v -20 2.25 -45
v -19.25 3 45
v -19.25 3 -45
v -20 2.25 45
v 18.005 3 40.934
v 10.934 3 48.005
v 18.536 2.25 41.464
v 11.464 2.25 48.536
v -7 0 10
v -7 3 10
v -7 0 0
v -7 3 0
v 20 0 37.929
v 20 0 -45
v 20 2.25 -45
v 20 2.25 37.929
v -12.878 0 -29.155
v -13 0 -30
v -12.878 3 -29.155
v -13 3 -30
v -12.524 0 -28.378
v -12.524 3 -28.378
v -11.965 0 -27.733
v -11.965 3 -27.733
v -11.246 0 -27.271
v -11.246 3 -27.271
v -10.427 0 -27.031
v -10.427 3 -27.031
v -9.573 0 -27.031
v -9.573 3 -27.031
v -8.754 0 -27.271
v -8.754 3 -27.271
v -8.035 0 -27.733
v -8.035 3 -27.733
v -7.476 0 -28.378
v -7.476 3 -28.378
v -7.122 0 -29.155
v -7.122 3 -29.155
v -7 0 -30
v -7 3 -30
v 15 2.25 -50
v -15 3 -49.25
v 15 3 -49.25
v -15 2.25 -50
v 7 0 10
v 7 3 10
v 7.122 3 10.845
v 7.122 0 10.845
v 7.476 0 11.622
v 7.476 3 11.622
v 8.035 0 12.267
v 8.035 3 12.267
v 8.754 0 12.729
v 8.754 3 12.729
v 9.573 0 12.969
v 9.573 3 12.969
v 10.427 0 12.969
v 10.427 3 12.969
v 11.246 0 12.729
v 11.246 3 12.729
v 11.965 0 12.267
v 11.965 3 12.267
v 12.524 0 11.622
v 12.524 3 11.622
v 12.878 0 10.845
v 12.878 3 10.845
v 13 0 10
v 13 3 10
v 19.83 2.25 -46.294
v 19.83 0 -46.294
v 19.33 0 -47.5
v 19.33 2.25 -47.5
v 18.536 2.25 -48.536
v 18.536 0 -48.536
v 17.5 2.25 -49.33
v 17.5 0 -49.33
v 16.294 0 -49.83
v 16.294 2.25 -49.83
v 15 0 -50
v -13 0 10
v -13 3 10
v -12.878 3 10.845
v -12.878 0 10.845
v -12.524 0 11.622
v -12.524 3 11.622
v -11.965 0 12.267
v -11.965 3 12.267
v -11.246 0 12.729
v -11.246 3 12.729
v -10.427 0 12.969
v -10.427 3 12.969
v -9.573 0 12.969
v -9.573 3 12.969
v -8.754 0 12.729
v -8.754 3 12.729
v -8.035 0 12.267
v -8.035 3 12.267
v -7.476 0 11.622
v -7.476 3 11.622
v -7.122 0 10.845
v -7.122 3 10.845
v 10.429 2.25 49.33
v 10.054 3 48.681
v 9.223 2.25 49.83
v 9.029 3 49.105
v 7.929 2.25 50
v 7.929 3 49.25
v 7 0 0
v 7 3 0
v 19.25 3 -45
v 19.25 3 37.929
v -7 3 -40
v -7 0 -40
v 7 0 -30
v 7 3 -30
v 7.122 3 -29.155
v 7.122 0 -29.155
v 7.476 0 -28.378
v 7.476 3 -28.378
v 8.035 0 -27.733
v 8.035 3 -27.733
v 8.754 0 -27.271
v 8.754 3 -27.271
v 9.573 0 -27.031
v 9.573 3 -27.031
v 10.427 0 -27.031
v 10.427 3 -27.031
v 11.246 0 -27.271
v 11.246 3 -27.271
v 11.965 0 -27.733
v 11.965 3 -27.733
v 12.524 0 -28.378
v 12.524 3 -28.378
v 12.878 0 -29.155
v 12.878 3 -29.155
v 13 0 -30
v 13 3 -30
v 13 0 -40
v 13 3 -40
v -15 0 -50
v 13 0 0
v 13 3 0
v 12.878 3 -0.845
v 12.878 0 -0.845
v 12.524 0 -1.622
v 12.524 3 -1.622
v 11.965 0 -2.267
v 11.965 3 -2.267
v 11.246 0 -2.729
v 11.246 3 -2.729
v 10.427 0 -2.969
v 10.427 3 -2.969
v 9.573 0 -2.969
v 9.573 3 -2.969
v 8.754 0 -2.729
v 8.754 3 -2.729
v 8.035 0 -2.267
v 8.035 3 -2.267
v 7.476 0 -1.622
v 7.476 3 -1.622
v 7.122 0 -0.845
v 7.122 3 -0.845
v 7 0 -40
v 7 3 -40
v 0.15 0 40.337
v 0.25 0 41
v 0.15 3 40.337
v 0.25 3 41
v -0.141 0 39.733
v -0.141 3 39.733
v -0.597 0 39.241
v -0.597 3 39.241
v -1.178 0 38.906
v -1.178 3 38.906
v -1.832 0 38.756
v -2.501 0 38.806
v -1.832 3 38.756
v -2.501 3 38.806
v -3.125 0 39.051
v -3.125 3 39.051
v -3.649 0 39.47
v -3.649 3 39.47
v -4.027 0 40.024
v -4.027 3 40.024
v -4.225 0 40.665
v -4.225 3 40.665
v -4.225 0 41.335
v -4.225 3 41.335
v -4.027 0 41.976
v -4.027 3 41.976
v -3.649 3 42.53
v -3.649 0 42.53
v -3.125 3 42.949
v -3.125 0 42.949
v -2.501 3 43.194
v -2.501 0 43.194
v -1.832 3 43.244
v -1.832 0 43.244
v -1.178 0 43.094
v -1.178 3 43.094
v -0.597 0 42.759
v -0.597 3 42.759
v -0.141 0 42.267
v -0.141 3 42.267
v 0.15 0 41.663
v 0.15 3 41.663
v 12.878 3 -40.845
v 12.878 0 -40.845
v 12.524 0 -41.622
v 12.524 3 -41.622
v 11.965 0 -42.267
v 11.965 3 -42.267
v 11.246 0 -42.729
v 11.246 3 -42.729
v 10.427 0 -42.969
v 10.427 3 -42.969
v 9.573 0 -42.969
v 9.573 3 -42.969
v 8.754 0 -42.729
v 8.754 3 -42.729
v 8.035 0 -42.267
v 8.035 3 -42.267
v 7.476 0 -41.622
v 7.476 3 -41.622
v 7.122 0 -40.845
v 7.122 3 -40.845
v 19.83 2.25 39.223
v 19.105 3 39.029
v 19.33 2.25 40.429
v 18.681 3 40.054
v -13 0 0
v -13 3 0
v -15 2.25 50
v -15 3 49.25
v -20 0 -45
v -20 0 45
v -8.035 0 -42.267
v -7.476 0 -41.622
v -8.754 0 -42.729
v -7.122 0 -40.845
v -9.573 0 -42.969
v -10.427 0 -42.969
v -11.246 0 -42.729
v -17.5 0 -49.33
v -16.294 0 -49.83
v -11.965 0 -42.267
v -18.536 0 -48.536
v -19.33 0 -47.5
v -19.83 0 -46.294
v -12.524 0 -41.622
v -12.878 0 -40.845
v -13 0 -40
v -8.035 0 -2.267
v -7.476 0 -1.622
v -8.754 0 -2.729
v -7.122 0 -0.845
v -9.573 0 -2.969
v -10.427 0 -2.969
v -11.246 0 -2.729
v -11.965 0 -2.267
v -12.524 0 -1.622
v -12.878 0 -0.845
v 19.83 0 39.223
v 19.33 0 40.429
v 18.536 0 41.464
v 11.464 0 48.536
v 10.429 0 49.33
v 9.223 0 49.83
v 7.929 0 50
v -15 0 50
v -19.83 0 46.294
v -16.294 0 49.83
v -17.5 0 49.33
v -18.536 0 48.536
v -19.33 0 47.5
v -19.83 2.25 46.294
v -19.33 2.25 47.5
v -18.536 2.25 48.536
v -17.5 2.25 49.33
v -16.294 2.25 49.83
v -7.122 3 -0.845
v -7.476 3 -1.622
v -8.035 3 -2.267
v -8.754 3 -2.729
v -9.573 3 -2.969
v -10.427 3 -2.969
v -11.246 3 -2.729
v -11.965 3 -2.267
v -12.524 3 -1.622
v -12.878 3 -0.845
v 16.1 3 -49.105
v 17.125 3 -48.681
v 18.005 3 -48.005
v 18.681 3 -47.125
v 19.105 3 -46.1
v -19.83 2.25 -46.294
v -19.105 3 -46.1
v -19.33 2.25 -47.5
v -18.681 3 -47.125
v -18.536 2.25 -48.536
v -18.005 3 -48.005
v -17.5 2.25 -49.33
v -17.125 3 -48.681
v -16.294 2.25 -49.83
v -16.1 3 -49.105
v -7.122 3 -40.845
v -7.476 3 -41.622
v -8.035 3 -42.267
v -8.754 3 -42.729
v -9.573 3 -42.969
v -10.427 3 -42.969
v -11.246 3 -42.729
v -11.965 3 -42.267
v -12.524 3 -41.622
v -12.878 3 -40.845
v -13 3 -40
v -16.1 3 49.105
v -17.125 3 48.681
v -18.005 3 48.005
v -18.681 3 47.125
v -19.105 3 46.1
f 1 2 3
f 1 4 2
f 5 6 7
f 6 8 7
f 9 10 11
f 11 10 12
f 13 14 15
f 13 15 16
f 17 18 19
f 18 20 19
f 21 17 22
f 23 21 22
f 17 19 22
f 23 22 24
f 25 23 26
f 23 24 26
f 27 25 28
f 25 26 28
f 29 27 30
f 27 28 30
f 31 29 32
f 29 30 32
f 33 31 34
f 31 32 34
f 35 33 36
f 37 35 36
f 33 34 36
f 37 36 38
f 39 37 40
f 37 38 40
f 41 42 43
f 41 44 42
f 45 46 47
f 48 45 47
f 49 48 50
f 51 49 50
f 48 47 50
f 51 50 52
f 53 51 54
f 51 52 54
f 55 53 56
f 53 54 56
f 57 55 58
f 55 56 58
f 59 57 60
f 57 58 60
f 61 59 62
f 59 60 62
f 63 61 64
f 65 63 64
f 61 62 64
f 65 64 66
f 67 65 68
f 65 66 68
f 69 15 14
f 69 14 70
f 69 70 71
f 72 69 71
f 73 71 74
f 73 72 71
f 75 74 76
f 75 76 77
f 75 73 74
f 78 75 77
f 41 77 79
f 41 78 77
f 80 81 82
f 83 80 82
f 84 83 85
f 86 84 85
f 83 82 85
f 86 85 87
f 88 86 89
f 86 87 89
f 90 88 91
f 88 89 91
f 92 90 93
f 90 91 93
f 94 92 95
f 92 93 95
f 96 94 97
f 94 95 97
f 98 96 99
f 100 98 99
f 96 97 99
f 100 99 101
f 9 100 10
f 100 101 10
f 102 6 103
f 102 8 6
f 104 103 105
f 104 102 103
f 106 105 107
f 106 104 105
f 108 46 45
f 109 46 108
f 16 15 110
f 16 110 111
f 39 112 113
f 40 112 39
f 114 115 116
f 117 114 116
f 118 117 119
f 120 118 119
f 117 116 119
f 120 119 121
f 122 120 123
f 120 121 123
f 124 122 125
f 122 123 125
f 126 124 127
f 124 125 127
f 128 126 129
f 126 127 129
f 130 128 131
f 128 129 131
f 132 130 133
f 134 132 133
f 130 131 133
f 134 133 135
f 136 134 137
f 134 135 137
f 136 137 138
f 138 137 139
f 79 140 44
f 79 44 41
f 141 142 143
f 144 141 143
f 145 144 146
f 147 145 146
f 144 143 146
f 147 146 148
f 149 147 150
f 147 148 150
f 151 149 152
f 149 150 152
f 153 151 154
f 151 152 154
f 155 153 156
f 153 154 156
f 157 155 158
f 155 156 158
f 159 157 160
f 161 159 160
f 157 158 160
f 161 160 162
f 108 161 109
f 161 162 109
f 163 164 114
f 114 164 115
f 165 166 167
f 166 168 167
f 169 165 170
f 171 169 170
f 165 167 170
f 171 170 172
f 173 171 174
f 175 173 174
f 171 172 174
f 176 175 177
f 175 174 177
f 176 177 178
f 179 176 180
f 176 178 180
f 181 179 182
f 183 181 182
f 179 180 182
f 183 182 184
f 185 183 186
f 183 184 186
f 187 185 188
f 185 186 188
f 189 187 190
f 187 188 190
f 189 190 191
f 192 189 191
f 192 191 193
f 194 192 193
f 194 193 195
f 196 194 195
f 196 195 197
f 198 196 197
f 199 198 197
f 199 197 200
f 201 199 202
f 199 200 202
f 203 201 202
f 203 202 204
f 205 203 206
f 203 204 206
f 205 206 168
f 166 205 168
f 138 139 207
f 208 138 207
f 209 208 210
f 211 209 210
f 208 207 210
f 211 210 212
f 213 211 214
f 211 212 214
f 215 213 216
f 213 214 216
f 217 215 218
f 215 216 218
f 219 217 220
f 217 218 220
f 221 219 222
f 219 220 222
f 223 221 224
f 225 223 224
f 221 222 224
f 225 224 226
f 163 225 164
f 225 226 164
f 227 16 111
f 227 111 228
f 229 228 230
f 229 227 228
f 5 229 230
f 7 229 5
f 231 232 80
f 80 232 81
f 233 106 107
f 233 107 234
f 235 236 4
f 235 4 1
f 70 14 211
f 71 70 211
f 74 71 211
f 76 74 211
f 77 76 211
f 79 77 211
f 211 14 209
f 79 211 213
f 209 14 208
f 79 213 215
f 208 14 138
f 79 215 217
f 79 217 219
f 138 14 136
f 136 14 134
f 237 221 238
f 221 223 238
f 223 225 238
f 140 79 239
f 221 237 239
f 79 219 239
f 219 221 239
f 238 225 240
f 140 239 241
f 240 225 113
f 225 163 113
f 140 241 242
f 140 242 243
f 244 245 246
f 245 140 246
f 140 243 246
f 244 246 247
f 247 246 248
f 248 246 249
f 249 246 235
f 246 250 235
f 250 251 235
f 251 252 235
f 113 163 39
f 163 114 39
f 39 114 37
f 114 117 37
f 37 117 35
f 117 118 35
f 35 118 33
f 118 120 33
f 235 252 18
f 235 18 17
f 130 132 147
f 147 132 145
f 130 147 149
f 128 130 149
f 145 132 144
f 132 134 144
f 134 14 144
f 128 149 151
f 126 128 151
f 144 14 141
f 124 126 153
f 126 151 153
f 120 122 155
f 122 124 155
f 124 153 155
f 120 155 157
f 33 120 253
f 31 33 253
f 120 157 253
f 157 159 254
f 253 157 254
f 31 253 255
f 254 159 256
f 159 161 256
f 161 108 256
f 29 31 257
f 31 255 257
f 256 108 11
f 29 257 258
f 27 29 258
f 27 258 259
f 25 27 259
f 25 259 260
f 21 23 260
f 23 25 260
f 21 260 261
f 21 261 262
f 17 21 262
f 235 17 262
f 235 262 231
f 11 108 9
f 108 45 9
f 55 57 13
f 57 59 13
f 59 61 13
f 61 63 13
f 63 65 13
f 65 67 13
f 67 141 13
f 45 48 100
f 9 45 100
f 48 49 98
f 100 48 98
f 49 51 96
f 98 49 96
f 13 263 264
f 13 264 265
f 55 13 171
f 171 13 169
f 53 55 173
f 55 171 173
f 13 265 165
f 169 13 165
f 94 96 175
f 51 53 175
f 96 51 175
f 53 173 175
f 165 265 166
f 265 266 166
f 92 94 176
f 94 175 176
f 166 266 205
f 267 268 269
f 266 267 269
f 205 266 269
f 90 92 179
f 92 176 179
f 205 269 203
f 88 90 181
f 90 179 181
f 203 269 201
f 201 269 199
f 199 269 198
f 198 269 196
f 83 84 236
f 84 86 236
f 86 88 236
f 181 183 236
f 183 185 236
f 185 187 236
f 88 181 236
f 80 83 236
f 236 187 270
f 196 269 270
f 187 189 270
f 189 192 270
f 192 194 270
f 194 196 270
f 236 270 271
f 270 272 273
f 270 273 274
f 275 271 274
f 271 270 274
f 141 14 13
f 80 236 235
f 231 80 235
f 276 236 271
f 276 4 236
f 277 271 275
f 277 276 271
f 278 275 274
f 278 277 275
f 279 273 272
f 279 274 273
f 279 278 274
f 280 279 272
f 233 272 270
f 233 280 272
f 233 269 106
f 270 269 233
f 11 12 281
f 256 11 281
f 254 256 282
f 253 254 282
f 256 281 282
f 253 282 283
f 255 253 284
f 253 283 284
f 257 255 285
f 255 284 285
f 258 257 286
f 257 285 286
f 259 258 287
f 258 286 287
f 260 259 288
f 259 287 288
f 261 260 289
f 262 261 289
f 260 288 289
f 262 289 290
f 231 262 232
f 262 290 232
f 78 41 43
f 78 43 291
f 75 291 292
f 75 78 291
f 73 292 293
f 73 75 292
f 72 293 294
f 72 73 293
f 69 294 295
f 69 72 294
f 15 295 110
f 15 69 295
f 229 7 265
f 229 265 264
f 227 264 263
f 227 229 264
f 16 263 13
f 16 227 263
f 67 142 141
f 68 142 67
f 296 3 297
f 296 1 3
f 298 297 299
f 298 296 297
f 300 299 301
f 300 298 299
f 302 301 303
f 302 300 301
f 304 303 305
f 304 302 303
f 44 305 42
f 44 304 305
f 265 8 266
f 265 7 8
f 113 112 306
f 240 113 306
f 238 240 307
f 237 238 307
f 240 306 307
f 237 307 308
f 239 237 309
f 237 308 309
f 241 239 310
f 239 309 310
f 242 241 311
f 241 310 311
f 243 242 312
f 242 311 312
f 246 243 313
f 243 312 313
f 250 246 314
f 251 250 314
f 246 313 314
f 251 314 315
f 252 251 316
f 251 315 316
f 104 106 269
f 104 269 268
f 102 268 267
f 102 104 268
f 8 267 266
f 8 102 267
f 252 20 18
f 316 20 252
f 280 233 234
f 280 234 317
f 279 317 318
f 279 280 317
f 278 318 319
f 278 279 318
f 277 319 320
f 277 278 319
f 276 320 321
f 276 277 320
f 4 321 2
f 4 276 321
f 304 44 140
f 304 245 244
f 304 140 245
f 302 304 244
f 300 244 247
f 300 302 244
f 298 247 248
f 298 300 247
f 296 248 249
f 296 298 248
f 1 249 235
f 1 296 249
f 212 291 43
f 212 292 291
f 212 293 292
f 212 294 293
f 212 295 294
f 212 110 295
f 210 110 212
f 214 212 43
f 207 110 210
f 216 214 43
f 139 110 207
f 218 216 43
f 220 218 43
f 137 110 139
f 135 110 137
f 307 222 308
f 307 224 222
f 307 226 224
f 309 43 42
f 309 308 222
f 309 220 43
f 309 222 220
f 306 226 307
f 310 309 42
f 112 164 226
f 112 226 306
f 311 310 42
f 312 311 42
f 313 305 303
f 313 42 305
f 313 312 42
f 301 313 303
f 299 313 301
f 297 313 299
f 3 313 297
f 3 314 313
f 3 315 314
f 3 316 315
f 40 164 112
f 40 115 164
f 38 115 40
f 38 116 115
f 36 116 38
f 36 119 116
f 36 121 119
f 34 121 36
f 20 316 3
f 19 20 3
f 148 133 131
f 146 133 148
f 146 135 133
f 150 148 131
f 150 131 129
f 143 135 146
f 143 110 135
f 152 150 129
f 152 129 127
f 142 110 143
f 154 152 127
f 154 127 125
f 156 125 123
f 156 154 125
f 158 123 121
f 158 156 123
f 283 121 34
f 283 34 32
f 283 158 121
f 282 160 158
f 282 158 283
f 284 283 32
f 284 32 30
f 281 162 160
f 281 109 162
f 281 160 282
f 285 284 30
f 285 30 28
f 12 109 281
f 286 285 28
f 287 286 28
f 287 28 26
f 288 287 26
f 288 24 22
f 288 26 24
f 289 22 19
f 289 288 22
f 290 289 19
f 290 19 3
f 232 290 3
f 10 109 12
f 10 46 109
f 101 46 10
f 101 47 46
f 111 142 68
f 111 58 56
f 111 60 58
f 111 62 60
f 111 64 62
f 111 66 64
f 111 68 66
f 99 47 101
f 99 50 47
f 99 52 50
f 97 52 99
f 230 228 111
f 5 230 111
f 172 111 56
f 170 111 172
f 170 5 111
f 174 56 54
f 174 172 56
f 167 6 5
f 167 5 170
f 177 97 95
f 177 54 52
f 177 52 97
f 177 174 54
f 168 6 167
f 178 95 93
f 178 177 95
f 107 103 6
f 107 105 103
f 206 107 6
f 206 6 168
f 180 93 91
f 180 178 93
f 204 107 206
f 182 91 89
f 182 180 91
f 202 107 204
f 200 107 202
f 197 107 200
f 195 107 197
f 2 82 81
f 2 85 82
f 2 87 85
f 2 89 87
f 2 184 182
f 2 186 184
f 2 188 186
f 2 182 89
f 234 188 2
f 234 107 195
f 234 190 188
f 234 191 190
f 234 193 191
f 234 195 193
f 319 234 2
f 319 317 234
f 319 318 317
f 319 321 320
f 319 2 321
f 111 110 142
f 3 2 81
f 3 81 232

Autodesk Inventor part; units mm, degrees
ref_plane "YZ Plane" through (0, 0, 0) normal (1, 0, 0) x (0, 1, 0)
ref_plane "XZ Plane" through (0, 0, 0) normal (0, 1, 0) x (-1, 0, 0)
ref_plane "XY Plane" through (0, 0, 0) normal (0, 0, 1) x (1, 0, 0)
sketch "Sketch1" plane through (0, 0, 0) normal (0, 1, 0) x (-1, 0, 0)
  line L0 (-20, 50) -> (20, 50)
  line L1 (20, 50) -> (20, -50)
  line L2 (20, -50) -> (-20, -50)
  line L3 (-20, -50) -> (-20, 50)
  line L4 (-20, 50) -> (20, -50) construction
  line L5 (20, 50) -> (-20, -50) construction
  point P0 (0, 0)
  dimension "d0" = 100
  dimension "d1" = 40
extrude "Extrusion1" add sketch "Sketch1" along normal blind 3
sketch "Sketch2" plane through (0, 3, 0) normal (0, 1, 0) x (1, 0, 0)
  line L0 (-10, -10) -> (-10, 0) construction
  line L1 (-7, -10) -> (-7, 0)
  line L2 (-13, 0) -> (-13, -10)
  arc A0 (-13, -10) -> (-7, -10) centre (-10, -10) ccw
  arc A1 (-7, 0) -> (-13, 0) centre (-10, 0) ccw
  line L3 (-32, 15) -> (32, 15) construction
  line L4 (20, 50) -> (-20, 50) projected
  line L5 (0, 82) -> (0, -72) projected
  line L6 (-10, 40) -> (-10, 30) construction
  line L7 (-7, 40) -> (-7, 30)
  line L8 (-13, 30) -> (-13, 40)
  arc A2 (-7, 40) -> (-13, 40) centre (-10, 40) ccw
  arc A3 (-13, 30) -> (-7, 30) centre (-10, 30) ccw
  line L9 (10, -10) -> (10, 0) construction
  line L10 (7, -10) -> (7, 0)
  line L11 (13, 0) -> (13, -10)
  arc A4 (7, -10) -> (13, -10) centre (10, -10) ccw
  arc A5 (13, 0) -> (7, 0) centre (10, 0) ccw
  line L12 (10, 40) -> (10, 30) construction
  line L13 (7, 40) -> (7, 30)
  line L14 (13, 30) -> (13, 40)
  arc A6 (13, 40) -> (7, 40) centre (10, 40) ccw
  arc A7 (7, 30) -> (13, 30) centre (10, 30) ccw
  point P0 (0, 0)
  point P1 (-10, -5)
  point P2 (-10, 35)
  point P3 (10, -5)
  point P4 (10, 35)
  dimension "d4" = 3
  dimension "d5" = 10
  dimension "d6" = 20
  dimension "d7" = 35
  dimension "d8" = 10
  dimension "d24" = 40
sketch "Sketch3" plane through (0, 3, 0) normal (0, 1, 0) x (1, 0, 0)
  circle A0 centre (-2, -41) radius 2.25
  line L0 (-20, -50) -> (20, -50) projected
  line L1 (20, -50) -> (20, 50) projected
  line L2 (-20, 50) -> (-20, -50) projected
  point P0 (0, 0)
  dimension "d9" = 4.5
  dimension "d10" = 9
  dimension "d16" = 18
extrude "Extrusion2" cut sketch "Sketch3" against normal blind 3
extrude "Extrusion3" cut sketch "Sketch2" against normal blind 3
chamfer "Chamfer3" distance 10 angle 45 1 edges at (20, 1.5, 50)
fillet "Fillet2" radius 5 5 edges at (20, 1.5, 40) (10, 1.5, 50) (20, 1.5, -50) (-20, 1.5, -50) (-20, 1.5, 50)
chamfer "Chamfer4" distance 0.75 angle 45 10 edges at (20, 3, -3.5355) (18.5355, 3, -48.5355) (0, 3, -50) (-18.5355, 3, -48.5355) (-20, 3, 0) (-18.5355, 3, 48.5355) (-3.5355, 3, 50) (9.8423, 3, 49.6194) (15, 3, 45) (19.6194, 3, 39.8423)
properties part number "Middle"
